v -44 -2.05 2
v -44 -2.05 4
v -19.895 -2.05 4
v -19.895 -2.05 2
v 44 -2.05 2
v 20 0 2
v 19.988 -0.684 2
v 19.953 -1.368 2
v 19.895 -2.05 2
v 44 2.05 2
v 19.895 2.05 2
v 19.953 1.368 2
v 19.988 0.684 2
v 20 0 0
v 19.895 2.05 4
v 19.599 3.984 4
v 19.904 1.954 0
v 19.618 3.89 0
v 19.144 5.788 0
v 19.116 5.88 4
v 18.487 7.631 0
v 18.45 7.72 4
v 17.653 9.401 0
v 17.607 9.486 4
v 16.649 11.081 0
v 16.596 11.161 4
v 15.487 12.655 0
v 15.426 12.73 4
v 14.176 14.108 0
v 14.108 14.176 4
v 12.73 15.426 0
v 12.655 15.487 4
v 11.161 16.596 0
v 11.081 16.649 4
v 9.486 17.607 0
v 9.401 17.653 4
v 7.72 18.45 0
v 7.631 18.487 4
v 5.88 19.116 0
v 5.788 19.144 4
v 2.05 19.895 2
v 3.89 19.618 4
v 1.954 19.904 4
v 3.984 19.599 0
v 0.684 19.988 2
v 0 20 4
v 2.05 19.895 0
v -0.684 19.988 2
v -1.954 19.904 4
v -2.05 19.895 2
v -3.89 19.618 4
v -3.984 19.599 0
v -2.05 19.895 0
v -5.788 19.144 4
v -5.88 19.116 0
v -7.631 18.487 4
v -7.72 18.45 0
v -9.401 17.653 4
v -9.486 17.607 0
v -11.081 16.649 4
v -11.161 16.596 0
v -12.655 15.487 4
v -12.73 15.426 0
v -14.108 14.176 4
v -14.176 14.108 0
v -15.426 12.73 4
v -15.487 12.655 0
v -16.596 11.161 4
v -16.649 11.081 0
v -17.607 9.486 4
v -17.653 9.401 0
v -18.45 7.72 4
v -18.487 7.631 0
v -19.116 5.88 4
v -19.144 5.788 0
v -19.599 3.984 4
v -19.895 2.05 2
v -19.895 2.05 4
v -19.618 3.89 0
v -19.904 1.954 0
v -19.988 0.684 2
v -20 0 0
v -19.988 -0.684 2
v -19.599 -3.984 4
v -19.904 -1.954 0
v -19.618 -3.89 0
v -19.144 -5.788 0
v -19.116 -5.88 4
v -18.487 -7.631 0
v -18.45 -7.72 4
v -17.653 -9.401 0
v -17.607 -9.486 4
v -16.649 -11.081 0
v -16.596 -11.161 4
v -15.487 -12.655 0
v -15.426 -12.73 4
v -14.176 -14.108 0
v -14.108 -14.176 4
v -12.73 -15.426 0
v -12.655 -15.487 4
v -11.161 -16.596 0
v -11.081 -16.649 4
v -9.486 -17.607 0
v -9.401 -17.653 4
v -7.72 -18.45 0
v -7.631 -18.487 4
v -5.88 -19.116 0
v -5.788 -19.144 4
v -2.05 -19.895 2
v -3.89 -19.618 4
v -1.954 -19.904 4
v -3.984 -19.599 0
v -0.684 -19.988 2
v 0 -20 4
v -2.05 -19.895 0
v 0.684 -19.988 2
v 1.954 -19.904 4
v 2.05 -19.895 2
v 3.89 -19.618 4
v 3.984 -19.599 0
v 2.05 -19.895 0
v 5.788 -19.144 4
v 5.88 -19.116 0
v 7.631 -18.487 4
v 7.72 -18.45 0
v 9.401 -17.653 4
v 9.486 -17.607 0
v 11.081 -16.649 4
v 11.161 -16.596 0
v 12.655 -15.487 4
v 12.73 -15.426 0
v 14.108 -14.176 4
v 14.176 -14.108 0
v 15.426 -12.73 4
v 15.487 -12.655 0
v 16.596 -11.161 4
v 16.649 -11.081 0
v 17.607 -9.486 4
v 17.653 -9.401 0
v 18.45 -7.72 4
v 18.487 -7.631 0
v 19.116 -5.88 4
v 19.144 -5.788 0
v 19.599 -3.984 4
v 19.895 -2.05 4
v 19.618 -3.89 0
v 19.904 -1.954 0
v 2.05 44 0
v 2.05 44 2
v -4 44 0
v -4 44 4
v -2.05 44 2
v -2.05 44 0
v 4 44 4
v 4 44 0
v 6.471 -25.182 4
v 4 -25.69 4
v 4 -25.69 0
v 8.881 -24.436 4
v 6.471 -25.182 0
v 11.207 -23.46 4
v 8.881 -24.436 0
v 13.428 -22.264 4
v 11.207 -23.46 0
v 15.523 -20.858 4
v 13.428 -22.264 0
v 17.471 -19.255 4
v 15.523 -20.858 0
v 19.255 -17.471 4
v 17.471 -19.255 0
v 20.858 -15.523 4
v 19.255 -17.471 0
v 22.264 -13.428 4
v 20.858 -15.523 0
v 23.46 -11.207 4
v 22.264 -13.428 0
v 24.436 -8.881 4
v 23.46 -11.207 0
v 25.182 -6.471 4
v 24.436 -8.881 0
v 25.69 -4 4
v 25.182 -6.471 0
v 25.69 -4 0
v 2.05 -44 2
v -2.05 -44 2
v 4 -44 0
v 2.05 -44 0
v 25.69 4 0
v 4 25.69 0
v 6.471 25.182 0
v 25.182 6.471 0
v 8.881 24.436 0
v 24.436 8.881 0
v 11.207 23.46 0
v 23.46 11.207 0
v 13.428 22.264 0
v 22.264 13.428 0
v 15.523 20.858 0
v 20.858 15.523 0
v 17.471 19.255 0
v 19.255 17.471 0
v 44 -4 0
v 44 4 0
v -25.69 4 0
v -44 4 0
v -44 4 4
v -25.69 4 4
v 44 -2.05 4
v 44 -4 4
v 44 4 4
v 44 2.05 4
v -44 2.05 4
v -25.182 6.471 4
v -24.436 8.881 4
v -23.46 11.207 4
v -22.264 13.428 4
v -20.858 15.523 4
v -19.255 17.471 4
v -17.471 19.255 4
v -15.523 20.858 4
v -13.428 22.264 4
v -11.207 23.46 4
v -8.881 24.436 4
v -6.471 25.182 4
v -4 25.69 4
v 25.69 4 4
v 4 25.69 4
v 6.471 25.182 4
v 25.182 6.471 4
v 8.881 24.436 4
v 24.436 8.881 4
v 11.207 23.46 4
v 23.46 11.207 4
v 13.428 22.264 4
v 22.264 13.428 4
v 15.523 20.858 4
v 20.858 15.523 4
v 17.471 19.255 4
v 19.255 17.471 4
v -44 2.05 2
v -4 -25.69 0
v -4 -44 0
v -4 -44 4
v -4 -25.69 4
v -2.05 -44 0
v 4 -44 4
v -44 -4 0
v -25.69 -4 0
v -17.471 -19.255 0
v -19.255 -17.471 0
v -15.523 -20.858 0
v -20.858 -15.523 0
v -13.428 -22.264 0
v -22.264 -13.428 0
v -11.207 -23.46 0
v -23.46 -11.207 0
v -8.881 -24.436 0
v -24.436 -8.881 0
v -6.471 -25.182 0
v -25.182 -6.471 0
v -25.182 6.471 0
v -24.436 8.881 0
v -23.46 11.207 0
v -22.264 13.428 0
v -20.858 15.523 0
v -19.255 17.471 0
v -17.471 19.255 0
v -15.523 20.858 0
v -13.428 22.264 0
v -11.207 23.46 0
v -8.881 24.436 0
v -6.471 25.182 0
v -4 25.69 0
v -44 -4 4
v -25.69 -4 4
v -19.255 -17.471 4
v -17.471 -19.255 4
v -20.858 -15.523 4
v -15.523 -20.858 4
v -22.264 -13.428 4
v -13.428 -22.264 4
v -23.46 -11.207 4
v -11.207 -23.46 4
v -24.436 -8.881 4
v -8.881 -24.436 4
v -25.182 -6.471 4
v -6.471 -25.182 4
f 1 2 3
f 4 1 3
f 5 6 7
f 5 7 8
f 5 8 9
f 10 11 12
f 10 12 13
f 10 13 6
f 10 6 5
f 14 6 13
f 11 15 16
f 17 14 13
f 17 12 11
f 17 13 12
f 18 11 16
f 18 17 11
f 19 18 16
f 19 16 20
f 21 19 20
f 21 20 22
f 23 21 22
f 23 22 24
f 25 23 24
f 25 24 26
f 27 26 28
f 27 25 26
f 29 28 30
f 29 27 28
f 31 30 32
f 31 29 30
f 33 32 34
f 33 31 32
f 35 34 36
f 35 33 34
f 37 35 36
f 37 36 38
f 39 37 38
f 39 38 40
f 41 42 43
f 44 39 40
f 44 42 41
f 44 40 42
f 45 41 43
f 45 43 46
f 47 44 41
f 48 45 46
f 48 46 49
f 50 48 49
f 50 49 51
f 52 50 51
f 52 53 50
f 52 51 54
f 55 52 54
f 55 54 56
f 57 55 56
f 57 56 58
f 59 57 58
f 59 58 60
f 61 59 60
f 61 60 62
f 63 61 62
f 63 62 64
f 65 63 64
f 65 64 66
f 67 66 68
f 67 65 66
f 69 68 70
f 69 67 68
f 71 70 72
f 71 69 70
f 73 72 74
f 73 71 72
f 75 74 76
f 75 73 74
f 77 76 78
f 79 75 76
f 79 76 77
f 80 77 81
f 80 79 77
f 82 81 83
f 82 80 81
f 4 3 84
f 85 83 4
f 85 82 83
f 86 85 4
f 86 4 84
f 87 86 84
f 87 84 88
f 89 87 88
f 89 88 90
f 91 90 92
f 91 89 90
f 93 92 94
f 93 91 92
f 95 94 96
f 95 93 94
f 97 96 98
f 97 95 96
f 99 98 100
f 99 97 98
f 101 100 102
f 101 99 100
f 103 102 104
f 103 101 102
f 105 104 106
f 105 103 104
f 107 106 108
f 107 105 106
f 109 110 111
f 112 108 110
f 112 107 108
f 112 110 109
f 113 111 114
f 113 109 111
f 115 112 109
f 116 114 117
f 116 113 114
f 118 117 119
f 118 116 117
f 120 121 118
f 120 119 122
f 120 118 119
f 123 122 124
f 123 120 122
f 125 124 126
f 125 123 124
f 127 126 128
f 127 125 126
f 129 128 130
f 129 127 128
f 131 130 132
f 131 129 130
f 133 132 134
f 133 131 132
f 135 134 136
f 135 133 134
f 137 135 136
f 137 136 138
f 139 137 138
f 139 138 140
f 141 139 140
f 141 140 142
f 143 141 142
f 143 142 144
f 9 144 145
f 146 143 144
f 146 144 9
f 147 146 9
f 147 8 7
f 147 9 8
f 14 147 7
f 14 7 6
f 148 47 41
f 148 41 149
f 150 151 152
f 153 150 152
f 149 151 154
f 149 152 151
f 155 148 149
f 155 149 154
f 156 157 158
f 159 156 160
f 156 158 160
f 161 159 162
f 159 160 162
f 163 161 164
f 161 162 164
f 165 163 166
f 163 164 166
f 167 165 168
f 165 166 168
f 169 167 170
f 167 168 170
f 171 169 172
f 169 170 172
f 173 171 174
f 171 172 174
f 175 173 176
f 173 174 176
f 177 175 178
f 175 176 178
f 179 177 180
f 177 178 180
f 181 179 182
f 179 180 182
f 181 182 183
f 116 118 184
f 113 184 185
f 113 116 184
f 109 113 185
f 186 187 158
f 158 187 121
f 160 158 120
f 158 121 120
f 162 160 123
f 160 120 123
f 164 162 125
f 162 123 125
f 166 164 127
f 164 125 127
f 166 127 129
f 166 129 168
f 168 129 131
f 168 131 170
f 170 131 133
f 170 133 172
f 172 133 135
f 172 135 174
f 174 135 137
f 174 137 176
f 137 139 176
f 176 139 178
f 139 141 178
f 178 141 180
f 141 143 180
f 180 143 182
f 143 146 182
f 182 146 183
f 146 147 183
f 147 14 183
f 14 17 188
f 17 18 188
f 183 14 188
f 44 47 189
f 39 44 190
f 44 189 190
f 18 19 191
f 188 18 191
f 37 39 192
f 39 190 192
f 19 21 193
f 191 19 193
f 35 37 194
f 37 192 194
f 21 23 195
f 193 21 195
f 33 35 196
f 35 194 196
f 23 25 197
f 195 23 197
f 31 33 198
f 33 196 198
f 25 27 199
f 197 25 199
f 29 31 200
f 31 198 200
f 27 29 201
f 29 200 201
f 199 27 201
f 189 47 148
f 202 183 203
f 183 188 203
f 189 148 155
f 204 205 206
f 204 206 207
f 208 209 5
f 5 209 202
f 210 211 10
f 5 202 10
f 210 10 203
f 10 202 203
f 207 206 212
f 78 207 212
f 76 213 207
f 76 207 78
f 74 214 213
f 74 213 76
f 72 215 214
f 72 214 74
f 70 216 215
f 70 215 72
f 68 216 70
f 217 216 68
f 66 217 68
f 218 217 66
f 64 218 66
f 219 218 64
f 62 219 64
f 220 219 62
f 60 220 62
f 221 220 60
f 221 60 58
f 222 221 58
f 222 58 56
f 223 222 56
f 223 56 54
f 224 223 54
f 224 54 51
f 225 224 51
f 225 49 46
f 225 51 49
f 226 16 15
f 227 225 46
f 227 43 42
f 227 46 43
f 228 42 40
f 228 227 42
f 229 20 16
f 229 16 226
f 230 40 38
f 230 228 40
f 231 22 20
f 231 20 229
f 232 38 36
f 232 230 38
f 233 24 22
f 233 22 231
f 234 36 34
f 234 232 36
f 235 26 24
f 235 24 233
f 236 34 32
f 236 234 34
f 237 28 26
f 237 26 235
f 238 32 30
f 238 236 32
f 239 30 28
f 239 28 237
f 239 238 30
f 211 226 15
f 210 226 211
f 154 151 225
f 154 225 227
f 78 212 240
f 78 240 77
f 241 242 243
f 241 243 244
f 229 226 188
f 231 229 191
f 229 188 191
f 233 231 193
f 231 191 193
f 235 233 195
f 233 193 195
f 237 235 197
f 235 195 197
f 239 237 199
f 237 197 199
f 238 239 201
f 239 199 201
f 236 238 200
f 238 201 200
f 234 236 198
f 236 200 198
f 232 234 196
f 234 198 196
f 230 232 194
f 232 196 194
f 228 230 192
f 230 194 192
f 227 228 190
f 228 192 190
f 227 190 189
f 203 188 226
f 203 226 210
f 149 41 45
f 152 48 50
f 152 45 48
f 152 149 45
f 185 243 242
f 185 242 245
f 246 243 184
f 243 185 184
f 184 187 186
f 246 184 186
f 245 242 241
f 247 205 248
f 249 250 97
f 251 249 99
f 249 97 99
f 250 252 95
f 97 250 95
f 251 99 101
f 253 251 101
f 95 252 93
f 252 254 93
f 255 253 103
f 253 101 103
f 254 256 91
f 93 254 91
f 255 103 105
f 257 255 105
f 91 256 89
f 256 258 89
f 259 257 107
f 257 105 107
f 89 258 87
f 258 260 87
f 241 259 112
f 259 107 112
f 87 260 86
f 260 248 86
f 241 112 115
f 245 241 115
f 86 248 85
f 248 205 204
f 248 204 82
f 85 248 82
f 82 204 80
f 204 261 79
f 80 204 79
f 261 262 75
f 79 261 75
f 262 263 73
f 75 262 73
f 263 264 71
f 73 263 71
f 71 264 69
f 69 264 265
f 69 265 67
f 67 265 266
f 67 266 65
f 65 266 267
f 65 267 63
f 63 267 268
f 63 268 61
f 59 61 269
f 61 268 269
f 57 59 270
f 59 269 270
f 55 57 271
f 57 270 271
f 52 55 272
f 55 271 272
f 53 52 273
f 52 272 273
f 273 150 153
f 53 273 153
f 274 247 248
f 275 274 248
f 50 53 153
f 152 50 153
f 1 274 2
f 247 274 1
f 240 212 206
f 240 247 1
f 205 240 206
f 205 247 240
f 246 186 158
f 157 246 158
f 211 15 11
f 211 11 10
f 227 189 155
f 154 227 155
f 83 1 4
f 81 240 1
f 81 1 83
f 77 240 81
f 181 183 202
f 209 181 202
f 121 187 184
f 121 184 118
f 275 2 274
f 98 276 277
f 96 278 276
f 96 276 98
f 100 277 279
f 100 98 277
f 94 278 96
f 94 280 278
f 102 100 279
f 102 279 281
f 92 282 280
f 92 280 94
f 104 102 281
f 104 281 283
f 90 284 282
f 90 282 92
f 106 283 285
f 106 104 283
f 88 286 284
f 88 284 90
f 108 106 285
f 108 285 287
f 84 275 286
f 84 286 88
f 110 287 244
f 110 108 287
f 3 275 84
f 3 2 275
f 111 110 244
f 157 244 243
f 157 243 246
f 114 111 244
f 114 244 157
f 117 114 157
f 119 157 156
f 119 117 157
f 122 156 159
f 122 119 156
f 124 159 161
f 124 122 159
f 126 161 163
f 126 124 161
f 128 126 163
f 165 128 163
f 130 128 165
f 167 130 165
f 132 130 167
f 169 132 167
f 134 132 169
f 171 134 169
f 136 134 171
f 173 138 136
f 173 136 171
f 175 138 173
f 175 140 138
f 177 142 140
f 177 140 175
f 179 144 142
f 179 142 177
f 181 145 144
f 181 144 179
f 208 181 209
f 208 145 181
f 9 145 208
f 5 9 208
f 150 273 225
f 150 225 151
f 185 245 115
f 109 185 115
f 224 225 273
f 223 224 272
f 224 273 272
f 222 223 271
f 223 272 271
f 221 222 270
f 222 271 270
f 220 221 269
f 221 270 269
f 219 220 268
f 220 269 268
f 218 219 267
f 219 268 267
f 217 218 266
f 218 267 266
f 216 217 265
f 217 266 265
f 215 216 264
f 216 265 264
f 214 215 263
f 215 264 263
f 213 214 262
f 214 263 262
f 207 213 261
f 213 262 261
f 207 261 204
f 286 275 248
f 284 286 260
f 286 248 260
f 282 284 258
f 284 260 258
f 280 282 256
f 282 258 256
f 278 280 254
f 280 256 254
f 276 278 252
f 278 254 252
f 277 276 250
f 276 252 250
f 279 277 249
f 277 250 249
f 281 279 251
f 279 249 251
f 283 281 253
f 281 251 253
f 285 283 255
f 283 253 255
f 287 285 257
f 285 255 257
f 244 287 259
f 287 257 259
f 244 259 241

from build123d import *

# Parameters (mm, degrees)
SKETCH1_R                    = 26
SKETCH1_R_2                  = 20
RELIEVED_FLOATING_RING_DEPTH = 4
SKETCH2_W                    = 20
SKETCH2_H                    = 8
X_SLIDE_PAD_1_DEPTH          = 4
SKETCH3_W                    = 8
SKETCH3_H                    = 20
Y_SLIDE_PAD_1_DEPTH          = 4
SKETCH4_W                    = 20
SKETCH4_H                    = 8
X_SLIDE_PAD_1_2_DEPTH        = 4
SKETCH5_W                    = 8
SKETCH5_H                    = 20
Y_SLIDE_PAD_1_2_DEPTH        = 4
SKETCH6_W                    = 4.1
SKETCH6_H                    = 90
LOWER_Y_SLOTS_W4P1_H2_DEPTH  = 2
SKETCH7_W                    = 90
SKETCH7_H                    = 4.1
UPPER_X_SLOTS_W4P1_H2_DEPTH  = 2


with BuildPart() as part:
    # Sketch1 → Relieved_Floating_Ring (new body)
    with BuildSketch(Plane.XY):
        Circle(SKETCH1_R)
        Circle(SKETCH1_R_2, mode=Mode.SUBTRACT)
    extrude(amount=RELIEVED_FLOATING_RING_DEPTH)

    # Sketch2 → X_Slide_Pad_-1 (add)
    with BuildSketch(Plane.XY):
        with Locations((-34, 0)):
            Rectangle(SKETCH2_W, SKETCH2_H)
    extrude(amount=X_SLIDE_PAD_1_DEPTH)

    # Sketch3 → Y_Slide_Pad_-1 (add)
    with BuildSketch(Plane.XY):
        with Locations((0, -34)):
            Rectangle(SKETCH3_W, SKETCH3_H)
    extrude(amount=Y_SLIDE_PAD_1_DEPTH)

    # Sketch4 → X_Slide_Pad_1 2 (add)
    with BuildSketch(Plane.XY):
        with Locations((34, 0)):
            Rectangle(SKETCH4_W, SKETCH4_H)
    extrude(amount=X_SLIDE_PAD_1_2_DEPTH)

    # Sketch5 → Y_Slide_Pad_1 2 (add)
    with BuildSketch(Plane.XY):
        with Locations((0, 34)):
            Rectangle(SKETCH5_W, SKETCH5_H)
    extrude(amount=Y_SLIDE_PAD_1_2_DEPTH)

    # Sketch6 → Lower_Y_Slots_W4p1_H2 (cut)
    with BuildSketch(Plane(origin=(0, 0, 0), x_dir=(-1, 0, 0), z_dir=(0, 0, -1))):
        Rectangle(SKETCH6_W, SKETCH6_H)
    extrude(amount=-LOWER_Y_SLOTS_W4P1_H2_DEPTH, mode=Mode.SUBTRACT)

    # Sketch7 → Upper_X_Slots_W4p1_H2 (cut)
    with BuildSketch(Plane.XY.offset(4)):
        Rectangle(SKETCH7_W, SKETCH7_H)
    extrude(amount=-UPPER_X_SLOTS_W4P1_H2_DEPTH, mode=Mode.SUBTRACT)


solid = part.part
